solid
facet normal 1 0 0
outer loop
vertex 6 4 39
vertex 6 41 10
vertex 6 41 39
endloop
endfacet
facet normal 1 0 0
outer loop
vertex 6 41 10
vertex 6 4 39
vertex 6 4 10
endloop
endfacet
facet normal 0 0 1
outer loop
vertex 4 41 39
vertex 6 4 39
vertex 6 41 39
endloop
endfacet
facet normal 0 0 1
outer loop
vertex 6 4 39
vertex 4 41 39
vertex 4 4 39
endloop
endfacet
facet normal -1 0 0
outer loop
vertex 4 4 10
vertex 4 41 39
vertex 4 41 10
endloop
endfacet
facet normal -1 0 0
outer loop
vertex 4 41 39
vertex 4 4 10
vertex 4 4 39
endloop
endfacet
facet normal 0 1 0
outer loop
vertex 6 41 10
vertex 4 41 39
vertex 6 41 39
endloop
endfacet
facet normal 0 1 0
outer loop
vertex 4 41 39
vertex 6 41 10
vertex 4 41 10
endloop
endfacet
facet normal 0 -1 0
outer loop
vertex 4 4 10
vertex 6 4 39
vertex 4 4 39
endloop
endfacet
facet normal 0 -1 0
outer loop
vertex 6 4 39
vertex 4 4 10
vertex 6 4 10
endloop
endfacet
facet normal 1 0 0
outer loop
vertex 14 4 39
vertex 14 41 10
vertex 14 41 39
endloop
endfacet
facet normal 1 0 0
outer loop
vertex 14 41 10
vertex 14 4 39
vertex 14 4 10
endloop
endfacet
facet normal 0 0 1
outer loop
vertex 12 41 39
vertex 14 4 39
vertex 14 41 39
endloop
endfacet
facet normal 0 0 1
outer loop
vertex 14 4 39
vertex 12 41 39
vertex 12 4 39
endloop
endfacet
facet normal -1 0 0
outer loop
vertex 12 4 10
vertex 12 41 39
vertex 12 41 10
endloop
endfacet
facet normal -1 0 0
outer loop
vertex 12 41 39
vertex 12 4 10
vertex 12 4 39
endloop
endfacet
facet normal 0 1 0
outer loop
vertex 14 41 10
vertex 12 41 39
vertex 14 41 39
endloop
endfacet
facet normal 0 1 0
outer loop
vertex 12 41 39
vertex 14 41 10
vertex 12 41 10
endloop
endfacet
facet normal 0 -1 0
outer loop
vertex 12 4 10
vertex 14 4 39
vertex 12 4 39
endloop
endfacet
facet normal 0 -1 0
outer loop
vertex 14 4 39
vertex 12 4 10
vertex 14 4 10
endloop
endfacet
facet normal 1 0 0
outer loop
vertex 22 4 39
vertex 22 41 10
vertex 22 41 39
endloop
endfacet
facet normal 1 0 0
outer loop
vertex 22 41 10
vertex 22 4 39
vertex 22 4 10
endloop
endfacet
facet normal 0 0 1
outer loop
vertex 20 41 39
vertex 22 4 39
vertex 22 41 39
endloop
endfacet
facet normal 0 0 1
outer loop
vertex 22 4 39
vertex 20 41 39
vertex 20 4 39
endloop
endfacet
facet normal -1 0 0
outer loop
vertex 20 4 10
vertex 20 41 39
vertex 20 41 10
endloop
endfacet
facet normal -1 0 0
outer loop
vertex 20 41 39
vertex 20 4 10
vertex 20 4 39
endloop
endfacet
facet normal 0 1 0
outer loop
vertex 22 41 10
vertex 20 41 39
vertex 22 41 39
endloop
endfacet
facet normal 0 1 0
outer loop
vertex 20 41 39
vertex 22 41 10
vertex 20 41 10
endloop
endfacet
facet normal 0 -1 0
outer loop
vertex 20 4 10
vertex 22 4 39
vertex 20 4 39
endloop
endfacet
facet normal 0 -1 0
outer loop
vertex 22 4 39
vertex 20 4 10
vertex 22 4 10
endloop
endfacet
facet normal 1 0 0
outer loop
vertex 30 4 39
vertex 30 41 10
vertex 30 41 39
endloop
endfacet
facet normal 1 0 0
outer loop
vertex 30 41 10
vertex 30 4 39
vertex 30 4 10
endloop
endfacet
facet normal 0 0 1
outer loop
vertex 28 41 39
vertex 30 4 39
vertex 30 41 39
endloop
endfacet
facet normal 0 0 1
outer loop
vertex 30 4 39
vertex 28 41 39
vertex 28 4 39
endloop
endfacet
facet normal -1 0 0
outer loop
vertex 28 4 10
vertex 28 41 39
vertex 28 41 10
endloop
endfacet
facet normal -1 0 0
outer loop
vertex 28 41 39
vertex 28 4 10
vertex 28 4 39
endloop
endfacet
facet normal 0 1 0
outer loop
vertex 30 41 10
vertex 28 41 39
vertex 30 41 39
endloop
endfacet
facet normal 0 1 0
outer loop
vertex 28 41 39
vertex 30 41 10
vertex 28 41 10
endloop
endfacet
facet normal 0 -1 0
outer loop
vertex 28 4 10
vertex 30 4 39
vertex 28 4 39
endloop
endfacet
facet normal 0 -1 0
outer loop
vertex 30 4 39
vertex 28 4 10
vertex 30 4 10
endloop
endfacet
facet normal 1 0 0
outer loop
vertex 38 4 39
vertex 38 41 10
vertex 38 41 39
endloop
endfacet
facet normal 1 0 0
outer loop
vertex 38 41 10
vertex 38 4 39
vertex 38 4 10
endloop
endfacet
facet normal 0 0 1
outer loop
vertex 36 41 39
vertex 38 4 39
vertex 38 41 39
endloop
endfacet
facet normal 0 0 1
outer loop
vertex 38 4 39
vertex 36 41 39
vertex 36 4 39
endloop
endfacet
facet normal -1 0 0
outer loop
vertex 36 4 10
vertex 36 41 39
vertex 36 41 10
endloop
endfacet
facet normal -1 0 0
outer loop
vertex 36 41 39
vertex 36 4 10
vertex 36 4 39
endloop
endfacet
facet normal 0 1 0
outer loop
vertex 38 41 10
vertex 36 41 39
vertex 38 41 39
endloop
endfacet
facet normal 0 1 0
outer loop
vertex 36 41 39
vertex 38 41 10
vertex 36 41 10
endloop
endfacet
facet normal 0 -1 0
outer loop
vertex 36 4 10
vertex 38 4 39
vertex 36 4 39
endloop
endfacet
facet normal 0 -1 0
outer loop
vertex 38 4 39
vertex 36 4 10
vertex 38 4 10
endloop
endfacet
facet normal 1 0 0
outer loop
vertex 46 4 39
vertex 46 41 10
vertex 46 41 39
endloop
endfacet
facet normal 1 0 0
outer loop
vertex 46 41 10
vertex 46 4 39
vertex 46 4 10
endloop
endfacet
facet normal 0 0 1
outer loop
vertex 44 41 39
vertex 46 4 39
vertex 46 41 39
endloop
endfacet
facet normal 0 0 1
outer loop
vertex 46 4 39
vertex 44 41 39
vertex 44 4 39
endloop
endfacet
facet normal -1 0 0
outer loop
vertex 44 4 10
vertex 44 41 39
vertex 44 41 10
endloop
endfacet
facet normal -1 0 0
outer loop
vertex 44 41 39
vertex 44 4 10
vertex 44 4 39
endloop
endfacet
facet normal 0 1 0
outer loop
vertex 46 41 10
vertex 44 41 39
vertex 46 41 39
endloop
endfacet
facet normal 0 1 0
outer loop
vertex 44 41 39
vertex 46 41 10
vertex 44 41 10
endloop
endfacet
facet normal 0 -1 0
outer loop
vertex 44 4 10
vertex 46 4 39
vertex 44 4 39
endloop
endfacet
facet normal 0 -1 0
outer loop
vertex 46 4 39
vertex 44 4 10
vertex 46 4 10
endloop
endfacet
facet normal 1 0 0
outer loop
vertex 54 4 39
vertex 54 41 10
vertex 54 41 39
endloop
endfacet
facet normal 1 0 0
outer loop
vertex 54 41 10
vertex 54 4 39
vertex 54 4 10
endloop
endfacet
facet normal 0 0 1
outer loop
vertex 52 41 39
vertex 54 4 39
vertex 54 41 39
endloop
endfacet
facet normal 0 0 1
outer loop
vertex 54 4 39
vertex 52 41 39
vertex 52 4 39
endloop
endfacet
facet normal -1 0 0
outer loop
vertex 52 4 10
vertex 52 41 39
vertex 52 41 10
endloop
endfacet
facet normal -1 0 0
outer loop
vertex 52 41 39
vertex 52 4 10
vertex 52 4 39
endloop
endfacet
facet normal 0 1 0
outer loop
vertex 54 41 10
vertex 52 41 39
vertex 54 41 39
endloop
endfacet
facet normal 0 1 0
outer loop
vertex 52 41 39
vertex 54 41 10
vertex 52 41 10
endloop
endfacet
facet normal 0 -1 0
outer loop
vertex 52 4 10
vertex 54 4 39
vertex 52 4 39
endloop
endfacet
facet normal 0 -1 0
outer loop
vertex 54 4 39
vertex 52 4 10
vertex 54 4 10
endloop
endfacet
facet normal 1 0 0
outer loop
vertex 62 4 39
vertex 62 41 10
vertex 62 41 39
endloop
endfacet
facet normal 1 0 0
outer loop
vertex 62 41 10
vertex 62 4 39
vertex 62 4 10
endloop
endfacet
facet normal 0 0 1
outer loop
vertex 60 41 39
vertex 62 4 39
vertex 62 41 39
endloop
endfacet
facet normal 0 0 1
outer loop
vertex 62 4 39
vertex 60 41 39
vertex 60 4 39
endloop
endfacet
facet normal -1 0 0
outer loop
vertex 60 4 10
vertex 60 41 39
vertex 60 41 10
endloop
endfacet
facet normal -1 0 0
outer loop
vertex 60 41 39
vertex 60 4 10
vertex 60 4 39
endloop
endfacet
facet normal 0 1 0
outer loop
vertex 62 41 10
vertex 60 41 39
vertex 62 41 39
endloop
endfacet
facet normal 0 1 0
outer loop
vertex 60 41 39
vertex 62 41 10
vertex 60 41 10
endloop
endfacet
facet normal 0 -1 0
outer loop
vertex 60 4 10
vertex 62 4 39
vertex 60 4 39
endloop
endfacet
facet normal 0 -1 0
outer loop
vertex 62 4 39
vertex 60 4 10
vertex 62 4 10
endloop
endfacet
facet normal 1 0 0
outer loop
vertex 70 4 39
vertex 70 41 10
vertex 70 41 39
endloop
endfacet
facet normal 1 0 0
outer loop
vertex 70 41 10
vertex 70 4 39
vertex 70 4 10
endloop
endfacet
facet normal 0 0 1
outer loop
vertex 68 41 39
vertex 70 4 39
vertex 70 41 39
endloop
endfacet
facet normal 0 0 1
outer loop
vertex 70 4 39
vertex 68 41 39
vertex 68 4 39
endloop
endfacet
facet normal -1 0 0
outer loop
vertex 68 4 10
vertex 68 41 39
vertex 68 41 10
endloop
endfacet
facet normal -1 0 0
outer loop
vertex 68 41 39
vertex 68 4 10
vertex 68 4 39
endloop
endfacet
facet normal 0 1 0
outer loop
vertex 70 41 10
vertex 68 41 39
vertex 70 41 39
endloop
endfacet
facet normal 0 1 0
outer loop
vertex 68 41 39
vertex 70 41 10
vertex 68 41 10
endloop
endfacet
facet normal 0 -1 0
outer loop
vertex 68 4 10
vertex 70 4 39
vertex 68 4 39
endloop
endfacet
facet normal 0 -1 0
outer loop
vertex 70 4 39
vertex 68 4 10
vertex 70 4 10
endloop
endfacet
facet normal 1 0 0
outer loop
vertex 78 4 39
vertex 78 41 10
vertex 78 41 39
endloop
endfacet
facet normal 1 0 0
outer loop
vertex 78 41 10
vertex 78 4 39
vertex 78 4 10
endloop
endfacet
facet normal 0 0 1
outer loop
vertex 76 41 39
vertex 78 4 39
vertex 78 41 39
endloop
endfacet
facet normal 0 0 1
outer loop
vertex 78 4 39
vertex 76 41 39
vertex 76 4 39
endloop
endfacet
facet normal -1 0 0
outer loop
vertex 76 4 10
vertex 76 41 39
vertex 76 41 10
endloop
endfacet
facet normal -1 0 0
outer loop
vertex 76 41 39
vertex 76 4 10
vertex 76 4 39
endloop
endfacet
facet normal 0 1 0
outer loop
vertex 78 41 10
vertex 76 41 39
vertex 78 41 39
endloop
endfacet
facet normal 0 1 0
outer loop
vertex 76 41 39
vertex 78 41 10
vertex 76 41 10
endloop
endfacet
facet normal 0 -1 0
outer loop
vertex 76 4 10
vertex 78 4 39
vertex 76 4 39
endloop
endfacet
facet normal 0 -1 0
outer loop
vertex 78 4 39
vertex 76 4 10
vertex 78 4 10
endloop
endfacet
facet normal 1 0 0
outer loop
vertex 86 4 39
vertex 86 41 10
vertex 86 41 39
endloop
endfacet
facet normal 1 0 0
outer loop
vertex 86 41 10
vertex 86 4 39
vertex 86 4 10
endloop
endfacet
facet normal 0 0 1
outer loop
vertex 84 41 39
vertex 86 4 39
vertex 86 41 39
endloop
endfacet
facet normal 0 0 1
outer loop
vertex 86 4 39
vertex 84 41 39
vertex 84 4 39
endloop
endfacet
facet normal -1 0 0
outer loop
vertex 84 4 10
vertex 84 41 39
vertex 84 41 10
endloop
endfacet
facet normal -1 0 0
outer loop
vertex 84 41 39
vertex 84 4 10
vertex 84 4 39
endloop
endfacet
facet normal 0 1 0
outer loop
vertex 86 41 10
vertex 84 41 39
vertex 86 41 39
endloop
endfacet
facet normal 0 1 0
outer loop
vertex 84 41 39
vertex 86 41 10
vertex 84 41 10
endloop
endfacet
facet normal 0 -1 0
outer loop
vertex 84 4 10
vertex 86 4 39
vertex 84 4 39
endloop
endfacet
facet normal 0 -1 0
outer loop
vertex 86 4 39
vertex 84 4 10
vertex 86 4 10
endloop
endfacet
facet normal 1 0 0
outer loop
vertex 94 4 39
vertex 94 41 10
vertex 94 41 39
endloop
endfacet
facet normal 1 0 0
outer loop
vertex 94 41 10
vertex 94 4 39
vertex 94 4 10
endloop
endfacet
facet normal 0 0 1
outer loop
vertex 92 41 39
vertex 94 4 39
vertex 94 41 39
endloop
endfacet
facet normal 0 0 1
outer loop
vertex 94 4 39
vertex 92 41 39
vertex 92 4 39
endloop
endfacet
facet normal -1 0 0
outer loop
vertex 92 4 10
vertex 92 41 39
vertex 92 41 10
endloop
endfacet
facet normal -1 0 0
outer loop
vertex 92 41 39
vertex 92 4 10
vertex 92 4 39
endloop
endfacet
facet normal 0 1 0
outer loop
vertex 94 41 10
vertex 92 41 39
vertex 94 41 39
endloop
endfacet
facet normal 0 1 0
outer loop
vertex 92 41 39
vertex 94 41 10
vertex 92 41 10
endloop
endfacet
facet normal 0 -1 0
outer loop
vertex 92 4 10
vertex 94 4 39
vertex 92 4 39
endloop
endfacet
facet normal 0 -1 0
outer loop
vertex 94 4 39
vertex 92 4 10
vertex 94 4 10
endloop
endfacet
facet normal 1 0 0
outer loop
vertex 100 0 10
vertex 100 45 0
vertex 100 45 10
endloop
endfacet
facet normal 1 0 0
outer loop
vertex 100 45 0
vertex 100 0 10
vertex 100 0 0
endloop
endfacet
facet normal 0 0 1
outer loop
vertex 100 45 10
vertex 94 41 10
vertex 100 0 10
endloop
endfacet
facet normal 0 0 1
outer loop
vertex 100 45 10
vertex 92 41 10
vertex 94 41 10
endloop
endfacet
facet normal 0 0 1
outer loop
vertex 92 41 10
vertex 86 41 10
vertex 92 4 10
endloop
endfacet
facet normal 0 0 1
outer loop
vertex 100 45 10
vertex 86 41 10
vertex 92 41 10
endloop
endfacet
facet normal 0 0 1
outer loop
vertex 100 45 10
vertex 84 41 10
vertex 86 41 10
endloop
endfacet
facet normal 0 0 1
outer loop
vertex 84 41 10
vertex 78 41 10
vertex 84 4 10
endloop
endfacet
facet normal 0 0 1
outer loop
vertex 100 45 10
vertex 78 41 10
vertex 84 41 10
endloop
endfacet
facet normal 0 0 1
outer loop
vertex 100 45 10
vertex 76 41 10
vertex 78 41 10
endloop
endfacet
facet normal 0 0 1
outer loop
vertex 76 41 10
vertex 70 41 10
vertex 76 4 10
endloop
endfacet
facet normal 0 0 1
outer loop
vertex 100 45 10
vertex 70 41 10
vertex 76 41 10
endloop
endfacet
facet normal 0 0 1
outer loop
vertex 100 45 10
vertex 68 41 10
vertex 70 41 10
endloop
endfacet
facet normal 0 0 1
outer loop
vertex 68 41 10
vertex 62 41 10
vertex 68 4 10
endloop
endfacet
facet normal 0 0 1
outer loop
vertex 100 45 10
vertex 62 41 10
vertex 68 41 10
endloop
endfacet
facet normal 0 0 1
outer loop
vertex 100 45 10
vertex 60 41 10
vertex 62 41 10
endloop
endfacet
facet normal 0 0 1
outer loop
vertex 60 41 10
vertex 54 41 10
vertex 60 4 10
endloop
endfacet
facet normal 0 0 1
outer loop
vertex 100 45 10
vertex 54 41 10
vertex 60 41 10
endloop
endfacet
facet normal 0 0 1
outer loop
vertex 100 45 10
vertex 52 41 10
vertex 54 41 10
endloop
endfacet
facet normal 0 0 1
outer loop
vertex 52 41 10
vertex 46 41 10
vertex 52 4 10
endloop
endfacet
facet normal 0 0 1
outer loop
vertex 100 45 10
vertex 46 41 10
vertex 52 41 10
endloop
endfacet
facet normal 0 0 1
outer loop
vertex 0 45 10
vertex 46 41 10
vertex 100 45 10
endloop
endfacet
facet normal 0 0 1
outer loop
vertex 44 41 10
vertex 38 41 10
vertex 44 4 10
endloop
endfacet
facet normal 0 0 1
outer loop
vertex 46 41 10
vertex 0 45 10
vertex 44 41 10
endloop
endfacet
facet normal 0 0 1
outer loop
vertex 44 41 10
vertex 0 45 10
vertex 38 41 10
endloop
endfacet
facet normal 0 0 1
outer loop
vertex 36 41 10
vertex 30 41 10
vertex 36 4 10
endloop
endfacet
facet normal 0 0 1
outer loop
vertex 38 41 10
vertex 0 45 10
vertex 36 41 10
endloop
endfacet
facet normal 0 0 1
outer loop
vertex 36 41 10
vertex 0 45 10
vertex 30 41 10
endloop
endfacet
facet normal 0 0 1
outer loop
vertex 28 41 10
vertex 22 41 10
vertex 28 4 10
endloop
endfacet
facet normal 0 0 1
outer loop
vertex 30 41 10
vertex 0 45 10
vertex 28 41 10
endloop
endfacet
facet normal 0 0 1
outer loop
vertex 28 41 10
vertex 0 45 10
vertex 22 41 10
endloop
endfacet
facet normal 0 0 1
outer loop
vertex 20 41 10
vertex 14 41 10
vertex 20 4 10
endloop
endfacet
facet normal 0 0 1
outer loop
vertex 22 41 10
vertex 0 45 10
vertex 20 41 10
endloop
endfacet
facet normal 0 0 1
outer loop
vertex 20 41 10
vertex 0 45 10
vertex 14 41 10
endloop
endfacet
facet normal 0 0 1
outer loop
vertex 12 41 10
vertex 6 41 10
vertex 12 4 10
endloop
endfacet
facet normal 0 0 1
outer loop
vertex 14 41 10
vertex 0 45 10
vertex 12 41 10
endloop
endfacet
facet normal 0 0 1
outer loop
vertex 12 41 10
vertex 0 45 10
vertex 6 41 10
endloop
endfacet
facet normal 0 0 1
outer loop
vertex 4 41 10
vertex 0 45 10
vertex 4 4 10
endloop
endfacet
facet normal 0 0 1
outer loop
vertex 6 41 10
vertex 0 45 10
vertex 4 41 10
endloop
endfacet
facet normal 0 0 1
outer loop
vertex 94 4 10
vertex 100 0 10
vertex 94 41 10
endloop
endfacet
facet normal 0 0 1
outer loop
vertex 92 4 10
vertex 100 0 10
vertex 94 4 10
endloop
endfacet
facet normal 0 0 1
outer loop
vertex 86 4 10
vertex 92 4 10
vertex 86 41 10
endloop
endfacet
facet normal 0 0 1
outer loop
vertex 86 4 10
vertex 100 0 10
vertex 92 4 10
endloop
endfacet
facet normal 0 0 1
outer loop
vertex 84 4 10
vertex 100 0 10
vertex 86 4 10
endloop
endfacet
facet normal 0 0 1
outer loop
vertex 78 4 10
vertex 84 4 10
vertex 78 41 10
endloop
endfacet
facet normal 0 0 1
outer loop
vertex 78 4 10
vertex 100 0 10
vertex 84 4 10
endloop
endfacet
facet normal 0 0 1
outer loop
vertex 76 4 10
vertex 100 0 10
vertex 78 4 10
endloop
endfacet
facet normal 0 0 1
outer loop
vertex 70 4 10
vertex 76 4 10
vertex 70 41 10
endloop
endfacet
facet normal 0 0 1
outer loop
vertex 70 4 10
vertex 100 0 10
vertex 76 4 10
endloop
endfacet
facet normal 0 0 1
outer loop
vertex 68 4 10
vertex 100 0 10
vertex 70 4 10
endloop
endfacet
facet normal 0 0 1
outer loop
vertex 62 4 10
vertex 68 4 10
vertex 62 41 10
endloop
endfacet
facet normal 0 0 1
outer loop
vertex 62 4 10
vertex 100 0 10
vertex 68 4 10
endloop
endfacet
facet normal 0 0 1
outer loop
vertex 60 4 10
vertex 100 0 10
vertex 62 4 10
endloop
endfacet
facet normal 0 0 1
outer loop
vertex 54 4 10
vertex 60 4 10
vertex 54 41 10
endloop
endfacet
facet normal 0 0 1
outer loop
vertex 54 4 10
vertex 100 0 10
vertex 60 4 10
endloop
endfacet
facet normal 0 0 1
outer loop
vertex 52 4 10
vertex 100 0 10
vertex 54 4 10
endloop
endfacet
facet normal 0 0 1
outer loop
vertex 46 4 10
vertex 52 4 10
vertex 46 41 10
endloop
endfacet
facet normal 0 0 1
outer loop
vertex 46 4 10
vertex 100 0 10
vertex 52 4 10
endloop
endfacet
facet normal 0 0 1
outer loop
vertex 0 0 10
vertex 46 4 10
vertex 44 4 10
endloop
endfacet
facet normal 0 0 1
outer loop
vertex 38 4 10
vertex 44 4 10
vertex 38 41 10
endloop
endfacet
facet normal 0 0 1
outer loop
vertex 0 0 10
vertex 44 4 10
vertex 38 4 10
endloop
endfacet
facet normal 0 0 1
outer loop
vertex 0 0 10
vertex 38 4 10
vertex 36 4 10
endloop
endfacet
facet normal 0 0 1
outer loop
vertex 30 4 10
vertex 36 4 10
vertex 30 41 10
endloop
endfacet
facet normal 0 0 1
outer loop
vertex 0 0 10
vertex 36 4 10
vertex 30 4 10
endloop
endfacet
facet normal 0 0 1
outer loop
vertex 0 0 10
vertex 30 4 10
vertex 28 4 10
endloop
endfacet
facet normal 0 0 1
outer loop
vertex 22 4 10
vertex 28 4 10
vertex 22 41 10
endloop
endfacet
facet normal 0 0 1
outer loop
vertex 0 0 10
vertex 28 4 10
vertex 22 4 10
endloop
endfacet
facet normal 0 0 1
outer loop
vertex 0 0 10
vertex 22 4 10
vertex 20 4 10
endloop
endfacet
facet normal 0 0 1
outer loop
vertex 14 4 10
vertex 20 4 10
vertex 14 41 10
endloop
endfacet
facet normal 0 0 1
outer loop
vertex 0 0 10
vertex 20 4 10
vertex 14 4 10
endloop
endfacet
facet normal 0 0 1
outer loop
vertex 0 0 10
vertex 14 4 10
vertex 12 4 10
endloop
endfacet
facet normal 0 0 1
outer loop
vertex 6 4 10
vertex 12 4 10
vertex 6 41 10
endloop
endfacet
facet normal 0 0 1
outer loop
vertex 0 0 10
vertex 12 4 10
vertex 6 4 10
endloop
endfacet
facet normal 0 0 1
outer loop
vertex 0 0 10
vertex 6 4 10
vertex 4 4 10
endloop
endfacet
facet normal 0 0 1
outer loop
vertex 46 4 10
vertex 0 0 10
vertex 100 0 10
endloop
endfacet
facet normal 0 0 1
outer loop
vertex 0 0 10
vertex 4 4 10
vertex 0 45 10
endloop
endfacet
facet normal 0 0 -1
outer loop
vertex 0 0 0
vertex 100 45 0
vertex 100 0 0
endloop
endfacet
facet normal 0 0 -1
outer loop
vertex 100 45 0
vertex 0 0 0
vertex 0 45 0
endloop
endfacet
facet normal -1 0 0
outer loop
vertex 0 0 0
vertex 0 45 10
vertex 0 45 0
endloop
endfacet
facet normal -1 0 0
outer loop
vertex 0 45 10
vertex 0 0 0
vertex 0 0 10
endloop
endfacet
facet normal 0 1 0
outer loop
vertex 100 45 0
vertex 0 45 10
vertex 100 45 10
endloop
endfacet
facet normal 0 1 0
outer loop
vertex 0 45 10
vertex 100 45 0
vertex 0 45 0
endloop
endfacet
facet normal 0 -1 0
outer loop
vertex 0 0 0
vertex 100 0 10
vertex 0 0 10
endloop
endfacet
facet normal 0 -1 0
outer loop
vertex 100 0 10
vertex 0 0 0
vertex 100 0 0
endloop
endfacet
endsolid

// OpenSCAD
$fn = 32;

// ----------------------------------------------------------------------
// Heatsink: uniform fin block
// ----------------------------------------------------------------------

// --- parameters (mm) ---
base_l = 100;             // base length, X
base_w = 45;              // base width, Y
base_t = 10;              // base plate thickness
fin_h = 30;               // fin height above the base
fin_t = 2;                // fin thickness
edge = 4;                 // margin from the base ends
pitch = 8;                // fin pitch

n_fins = floor((base_l - 2 * edge - fin_t) / pitch) + 1;  // fin count
total_h = base_t + fin_h - 1;  // overall height

union() {
  cube([base_l, base_w, base_t]);
  for (i = [0 : n_fins - 1])
    translate([edge + i * pitch, edge, base_t - 1])
      cube([fin_t, base_w - 2 * edge, fin_h]);
}
